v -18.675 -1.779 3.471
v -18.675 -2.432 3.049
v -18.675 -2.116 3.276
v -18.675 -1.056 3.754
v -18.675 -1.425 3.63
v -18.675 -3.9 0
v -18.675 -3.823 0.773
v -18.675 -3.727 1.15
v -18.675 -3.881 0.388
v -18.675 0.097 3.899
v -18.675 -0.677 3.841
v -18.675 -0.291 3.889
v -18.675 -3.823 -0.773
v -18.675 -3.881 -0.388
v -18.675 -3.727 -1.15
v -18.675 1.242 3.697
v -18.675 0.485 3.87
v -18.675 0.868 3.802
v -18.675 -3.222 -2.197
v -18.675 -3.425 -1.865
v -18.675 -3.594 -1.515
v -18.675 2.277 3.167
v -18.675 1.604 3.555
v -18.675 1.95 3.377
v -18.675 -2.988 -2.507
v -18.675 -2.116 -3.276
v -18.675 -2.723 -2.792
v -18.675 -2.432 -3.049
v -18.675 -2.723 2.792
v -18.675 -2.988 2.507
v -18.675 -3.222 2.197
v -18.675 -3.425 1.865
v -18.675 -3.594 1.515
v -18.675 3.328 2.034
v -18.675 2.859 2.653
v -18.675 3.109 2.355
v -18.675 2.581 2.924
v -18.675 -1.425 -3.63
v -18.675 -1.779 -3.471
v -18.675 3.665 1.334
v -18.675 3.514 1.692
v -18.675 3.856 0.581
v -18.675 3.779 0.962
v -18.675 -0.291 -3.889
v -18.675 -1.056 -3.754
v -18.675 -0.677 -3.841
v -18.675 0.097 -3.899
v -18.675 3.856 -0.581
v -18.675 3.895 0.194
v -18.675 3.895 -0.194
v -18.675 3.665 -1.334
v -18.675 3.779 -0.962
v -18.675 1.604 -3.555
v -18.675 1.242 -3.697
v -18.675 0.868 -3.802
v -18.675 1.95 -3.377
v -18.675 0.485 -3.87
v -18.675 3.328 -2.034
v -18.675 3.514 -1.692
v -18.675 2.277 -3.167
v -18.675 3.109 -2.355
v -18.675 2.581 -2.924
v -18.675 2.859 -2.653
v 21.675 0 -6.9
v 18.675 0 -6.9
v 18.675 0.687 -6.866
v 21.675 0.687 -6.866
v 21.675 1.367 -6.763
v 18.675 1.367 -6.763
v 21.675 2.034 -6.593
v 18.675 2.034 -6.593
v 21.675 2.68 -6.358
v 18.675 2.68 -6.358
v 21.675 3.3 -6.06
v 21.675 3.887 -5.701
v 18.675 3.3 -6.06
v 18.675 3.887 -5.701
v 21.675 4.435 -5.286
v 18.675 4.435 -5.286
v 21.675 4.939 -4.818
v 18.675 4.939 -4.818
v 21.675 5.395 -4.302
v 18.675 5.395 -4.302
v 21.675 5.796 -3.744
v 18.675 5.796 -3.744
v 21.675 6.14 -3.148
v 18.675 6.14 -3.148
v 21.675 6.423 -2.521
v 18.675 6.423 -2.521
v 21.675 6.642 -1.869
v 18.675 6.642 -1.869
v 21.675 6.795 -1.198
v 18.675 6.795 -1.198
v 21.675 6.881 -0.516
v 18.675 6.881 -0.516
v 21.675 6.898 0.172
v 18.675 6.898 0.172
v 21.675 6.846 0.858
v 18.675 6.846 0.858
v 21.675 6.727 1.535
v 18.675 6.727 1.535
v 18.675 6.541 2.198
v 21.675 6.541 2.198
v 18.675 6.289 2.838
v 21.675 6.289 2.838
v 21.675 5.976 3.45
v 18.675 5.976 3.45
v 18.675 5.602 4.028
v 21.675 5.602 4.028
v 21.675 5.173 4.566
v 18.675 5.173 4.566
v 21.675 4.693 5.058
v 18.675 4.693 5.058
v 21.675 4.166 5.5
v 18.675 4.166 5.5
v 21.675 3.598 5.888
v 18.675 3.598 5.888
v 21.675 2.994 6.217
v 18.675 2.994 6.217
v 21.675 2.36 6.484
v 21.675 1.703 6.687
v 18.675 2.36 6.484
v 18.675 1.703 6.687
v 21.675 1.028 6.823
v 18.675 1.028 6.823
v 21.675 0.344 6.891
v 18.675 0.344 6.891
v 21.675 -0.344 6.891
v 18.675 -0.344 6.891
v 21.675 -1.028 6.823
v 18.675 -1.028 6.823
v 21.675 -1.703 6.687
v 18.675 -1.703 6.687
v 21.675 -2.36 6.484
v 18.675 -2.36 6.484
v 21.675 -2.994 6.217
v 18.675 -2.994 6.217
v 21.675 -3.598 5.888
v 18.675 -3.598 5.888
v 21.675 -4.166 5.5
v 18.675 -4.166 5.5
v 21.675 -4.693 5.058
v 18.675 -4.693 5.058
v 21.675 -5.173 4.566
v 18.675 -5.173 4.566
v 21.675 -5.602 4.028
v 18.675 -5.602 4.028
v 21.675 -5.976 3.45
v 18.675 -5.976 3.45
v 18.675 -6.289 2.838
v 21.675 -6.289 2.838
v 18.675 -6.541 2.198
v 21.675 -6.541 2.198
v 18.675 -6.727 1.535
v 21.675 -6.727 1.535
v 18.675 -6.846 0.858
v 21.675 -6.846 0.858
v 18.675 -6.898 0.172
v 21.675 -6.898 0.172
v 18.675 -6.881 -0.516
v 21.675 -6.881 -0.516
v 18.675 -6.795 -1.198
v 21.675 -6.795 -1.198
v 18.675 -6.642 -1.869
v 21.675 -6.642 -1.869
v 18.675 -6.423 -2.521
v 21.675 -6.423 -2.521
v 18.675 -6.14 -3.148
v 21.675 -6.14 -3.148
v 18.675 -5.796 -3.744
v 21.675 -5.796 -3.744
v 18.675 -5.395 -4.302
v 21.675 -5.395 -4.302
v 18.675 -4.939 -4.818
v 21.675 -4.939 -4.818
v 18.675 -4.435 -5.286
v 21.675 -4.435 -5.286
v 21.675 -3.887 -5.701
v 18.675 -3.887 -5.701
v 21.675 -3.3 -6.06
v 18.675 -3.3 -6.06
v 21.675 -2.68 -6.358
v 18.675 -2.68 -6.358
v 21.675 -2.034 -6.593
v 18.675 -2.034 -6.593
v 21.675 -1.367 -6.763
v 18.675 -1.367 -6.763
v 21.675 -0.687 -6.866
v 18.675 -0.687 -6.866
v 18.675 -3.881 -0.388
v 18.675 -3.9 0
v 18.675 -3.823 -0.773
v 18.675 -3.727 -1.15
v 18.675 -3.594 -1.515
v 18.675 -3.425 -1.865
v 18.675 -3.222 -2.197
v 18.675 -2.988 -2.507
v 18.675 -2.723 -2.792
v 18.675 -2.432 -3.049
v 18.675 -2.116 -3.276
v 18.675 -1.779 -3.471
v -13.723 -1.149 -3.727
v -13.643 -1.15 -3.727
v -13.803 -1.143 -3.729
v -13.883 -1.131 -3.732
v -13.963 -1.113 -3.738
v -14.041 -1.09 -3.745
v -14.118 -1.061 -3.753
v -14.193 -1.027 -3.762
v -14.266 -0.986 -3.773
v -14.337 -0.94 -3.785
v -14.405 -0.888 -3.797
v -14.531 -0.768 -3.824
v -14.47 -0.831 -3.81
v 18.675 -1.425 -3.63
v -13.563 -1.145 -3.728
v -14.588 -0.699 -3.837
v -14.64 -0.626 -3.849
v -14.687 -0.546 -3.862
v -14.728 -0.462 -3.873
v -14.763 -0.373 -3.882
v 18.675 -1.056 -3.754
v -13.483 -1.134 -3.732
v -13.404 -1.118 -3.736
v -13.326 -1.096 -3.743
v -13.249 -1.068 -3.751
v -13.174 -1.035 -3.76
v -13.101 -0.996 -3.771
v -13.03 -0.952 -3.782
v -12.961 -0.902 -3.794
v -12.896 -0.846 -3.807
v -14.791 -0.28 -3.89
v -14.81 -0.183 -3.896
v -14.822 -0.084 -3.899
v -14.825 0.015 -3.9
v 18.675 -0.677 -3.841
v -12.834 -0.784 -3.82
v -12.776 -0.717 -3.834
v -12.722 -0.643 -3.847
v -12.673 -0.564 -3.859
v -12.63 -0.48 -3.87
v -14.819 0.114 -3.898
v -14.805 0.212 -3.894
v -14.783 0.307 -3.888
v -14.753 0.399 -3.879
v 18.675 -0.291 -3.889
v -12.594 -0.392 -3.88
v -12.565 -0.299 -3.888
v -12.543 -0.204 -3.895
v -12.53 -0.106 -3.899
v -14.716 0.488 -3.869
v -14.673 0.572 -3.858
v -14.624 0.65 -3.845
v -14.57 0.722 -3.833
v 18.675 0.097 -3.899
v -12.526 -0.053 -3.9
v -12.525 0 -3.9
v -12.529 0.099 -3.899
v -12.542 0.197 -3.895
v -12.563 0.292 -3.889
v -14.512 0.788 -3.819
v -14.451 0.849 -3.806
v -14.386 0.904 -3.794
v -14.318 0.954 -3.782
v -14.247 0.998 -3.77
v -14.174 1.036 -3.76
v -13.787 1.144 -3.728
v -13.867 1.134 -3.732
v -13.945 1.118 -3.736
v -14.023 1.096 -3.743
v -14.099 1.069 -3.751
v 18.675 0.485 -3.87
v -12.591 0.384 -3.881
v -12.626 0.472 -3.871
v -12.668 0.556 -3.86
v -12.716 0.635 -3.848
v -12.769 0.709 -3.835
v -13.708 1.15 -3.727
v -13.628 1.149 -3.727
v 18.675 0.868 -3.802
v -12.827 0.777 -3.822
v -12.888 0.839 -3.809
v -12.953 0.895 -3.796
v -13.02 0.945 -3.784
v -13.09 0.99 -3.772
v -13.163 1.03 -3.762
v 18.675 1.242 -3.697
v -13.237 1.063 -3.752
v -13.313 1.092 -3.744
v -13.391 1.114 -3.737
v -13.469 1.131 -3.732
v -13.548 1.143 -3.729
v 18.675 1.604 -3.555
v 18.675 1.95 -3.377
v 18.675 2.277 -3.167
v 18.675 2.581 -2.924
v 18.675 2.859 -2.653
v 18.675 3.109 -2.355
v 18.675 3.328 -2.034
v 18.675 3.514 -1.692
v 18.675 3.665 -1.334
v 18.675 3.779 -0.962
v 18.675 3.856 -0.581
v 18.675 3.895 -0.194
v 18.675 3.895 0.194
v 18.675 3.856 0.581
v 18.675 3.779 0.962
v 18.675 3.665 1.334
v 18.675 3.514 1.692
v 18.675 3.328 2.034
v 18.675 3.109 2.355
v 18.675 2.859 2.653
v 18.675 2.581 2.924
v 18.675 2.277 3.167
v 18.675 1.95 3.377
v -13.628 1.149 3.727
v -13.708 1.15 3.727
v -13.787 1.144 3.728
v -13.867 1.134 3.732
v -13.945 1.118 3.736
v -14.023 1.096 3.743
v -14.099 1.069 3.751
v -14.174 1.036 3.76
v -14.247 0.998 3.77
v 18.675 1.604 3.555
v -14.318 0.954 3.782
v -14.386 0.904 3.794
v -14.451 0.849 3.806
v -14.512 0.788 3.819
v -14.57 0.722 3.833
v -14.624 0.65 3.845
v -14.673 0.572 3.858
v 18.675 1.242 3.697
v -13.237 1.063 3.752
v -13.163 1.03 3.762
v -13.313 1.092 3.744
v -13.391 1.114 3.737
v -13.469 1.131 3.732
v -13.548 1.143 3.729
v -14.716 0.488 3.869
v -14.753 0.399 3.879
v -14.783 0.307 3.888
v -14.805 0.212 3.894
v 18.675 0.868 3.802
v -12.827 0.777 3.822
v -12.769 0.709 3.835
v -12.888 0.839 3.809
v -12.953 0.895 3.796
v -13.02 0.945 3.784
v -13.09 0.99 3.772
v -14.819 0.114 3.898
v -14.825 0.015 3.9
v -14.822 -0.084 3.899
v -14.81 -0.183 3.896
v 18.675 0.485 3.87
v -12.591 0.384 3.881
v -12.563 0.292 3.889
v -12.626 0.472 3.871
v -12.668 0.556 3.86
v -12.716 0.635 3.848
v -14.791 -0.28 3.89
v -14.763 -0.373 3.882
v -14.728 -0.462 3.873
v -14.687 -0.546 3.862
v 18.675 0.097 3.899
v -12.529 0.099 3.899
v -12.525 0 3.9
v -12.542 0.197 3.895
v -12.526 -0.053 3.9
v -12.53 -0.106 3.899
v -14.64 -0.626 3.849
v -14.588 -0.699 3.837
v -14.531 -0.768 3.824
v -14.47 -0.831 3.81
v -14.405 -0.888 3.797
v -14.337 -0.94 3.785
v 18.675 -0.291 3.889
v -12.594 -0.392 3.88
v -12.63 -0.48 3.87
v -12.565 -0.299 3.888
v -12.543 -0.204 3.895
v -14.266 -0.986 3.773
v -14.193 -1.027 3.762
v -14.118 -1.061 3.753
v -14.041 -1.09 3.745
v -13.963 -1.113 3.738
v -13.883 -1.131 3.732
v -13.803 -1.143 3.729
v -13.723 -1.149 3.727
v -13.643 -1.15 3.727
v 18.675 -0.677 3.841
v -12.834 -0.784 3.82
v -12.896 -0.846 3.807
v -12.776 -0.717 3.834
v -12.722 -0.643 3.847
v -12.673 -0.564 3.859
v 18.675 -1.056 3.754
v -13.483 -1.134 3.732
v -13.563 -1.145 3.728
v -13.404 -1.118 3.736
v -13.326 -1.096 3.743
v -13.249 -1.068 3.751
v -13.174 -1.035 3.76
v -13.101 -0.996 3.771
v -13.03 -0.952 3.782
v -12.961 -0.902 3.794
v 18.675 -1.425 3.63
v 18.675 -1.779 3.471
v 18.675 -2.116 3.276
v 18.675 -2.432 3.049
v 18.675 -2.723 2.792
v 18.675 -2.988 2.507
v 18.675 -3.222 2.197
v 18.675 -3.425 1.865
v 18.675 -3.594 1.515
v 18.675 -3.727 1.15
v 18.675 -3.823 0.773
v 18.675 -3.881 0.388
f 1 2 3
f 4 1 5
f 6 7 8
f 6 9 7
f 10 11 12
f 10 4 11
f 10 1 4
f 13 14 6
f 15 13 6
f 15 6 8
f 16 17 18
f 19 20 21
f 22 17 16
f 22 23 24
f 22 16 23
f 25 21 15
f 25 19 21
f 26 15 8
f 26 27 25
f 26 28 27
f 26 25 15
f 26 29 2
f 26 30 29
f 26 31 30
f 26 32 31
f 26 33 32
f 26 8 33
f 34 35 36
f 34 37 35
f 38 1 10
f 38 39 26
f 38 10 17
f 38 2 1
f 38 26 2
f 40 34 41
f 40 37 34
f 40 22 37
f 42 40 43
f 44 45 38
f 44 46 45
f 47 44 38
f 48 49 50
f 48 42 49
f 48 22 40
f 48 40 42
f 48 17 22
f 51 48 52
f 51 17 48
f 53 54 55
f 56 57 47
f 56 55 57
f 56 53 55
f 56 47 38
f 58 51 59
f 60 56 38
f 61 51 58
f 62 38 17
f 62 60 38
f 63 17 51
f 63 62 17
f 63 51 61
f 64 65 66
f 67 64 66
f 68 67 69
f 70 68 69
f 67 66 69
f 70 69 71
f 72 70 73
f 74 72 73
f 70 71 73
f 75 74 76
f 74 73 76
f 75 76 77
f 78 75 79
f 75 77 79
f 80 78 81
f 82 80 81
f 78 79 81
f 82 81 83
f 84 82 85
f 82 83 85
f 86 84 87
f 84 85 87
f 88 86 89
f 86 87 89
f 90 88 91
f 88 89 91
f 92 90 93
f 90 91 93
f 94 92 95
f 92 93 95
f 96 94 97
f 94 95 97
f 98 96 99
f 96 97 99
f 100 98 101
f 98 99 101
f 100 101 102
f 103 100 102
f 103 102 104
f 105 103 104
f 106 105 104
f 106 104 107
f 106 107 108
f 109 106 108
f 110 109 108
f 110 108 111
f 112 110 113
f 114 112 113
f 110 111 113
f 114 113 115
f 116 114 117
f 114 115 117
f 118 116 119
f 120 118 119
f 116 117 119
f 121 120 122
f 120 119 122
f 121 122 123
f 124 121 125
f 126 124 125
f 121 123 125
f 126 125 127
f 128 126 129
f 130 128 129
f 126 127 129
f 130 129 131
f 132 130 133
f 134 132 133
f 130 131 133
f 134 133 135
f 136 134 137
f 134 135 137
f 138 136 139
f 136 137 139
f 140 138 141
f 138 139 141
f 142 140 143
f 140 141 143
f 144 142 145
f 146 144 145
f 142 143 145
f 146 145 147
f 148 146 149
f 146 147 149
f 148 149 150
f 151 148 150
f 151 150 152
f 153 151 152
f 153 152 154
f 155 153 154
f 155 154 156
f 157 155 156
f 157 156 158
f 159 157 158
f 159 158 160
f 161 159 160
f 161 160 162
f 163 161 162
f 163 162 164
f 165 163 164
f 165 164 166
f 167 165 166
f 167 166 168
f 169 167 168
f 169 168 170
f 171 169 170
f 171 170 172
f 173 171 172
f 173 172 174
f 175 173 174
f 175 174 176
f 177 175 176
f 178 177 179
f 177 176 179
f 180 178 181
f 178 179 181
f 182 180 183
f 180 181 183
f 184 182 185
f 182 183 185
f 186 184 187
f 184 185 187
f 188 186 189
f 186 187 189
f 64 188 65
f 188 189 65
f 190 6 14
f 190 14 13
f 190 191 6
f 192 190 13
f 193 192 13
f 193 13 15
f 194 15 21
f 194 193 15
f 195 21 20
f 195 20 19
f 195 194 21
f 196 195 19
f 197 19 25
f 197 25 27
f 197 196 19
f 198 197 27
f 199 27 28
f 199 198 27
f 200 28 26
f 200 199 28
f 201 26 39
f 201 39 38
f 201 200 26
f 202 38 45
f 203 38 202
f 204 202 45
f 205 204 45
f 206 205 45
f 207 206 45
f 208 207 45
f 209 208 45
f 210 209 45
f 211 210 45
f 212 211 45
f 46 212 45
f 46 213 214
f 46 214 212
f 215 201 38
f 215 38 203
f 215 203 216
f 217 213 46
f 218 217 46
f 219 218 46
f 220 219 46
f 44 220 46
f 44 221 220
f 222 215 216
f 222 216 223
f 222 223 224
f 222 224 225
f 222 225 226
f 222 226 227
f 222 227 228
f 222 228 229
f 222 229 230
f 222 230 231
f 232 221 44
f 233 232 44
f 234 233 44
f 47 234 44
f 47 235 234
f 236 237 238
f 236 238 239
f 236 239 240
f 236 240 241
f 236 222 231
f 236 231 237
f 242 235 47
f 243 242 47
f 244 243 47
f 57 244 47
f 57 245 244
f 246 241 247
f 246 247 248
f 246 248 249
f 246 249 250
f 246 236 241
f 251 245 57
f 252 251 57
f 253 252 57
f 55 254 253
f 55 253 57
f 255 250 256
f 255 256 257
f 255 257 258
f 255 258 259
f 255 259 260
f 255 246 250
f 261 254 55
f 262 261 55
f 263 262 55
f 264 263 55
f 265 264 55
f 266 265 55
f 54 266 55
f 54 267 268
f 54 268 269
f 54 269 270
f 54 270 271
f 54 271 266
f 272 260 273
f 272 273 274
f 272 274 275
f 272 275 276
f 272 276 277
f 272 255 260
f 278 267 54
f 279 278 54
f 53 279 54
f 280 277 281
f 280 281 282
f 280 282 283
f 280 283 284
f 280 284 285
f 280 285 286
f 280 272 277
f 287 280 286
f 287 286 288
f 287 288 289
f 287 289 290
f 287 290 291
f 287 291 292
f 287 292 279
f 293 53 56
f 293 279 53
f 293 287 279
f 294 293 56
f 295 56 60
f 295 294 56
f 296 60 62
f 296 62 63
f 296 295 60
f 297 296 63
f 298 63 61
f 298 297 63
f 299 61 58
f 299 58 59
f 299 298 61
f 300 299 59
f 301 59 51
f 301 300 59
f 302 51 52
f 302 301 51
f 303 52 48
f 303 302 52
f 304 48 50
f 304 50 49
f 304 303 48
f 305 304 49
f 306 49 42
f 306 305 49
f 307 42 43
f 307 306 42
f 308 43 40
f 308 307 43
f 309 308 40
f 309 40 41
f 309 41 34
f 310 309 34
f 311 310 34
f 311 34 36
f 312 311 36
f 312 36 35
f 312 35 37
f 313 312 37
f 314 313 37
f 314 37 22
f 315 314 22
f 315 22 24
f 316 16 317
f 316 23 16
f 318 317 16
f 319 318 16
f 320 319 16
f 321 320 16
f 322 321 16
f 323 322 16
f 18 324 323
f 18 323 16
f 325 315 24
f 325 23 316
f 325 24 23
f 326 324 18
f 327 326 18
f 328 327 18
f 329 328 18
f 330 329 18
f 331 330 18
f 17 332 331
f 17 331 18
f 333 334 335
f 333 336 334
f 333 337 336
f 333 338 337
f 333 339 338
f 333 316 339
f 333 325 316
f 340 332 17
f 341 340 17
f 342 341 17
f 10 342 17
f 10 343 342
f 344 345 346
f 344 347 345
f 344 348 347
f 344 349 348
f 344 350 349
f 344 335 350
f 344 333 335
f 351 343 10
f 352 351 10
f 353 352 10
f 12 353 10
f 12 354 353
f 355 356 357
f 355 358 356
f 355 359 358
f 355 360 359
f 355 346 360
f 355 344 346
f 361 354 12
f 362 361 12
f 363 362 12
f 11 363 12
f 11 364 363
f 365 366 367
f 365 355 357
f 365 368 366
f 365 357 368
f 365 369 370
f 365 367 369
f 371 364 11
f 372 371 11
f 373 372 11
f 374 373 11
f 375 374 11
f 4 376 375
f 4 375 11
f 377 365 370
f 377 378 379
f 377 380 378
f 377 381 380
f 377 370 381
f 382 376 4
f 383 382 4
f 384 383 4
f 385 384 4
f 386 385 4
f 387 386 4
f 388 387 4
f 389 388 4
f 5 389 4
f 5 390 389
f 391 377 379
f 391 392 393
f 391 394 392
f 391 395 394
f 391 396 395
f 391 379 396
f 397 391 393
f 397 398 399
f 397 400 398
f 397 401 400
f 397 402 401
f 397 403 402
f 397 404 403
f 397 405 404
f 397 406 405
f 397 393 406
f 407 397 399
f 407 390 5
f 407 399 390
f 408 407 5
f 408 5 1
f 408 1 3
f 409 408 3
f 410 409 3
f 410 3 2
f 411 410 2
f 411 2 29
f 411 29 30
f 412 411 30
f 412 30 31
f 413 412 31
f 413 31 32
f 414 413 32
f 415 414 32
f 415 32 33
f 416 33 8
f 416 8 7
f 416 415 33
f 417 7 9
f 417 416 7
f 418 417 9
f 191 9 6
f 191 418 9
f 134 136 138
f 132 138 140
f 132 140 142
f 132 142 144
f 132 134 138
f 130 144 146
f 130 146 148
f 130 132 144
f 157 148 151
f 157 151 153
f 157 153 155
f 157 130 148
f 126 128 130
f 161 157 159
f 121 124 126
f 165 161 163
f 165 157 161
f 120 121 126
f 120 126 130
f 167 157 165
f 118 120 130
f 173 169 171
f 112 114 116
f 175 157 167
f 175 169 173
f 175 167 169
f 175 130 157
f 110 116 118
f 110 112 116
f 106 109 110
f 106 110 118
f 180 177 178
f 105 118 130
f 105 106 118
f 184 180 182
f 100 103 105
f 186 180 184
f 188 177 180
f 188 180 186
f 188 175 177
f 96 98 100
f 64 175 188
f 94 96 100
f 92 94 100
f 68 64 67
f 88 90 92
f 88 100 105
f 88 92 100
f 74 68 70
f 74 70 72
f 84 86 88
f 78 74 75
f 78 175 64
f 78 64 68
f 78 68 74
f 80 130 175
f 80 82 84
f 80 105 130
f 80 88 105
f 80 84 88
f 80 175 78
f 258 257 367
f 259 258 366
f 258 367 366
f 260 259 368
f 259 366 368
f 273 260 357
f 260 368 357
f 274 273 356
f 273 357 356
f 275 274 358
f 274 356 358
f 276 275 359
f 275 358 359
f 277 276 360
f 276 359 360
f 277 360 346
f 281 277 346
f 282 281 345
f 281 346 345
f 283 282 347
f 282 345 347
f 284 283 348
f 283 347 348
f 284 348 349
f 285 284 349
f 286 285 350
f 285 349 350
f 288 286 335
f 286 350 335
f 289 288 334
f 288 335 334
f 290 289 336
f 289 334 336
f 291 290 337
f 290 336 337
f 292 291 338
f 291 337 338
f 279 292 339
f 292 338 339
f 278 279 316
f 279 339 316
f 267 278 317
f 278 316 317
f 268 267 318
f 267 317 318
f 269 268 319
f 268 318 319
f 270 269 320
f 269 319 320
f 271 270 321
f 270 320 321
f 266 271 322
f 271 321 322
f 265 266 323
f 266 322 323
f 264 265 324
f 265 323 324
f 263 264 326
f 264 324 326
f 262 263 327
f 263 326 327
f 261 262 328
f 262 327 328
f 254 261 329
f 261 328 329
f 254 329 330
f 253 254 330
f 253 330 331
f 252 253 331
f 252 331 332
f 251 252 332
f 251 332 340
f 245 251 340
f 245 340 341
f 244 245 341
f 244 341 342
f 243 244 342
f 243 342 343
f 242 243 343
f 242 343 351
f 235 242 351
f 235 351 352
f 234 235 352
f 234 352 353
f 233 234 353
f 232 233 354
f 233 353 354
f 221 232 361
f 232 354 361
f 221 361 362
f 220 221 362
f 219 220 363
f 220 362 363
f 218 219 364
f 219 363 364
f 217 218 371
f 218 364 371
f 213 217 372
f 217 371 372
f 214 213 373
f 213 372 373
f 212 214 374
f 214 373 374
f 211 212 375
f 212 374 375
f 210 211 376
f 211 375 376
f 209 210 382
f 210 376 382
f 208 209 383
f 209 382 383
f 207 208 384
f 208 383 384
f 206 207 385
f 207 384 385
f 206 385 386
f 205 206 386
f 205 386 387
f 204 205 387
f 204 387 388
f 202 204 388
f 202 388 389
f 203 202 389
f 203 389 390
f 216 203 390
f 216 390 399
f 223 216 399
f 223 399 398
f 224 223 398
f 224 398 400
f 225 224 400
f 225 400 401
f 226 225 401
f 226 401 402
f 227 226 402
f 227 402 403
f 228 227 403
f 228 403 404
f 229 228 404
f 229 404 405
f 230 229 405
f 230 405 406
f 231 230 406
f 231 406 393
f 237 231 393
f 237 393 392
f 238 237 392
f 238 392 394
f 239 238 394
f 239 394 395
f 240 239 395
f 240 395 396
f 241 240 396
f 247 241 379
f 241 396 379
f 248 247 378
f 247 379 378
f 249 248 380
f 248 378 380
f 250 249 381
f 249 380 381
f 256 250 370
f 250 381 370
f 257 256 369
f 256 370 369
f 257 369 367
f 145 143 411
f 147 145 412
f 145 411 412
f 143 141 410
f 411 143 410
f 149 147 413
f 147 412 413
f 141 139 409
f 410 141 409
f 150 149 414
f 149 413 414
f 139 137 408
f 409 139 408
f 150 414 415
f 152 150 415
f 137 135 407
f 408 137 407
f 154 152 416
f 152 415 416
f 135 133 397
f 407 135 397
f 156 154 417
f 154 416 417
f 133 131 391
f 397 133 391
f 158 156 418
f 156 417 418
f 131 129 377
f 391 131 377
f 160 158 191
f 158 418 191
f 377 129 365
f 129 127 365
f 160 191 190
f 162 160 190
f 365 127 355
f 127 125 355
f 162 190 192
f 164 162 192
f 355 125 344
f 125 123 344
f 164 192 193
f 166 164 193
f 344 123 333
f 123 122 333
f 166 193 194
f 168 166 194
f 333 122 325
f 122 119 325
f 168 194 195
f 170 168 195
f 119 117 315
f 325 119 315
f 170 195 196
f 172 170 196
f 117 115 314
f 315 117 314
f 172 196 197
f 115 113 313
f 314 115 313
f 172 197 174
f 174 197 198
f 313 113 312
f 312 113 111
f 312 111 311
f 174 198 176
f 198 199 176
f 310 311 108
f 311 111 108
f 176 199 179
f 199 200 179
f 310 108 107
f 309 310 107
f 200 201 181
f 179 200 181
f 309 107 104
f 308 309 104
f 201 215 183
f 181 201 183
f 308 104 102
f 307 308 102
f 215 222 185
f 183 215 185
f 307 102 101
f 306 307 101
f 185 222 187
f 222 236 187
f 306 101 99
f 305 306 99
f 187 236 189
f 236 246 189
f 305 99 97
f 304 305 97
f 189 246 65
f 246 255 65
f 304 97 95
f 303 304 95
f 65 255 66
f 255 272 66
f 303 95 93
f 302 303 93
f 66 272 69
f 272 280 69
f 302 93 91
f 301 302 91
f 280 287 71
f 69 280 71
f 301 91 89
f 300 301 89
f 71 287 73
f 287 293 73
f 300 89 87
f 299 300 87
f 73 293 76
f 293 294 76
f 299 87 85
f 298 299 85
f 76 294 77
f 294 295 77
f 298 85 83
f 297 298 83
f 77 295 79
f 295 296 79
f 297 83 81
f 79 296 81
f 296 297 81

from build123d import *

# Parameters (mm, degrees)
SKETCH2_3_R             = 1.15
CUT_EXTRUDE1_DEPTH      = 4.9
CUT_EXTRUDE1_DEPTH_BACK = 4.9
SKETCH3_R               = 6.9
BOSS_EXTRUDE1_DEPTH     = 3


with BuildPart() as part:
    # Sketch2 → Revolve2 (revolve)
    with BuildSketch(Plane.XY):
        with BuildLine():
            Line((18.675, 0), (-12.525, 0))
            ThreePointArc((-12.525, 0), (-13.675, -1.15), (-14.825, 0))
            Line((-14.825, 0), (-18.675, 0))
            Line((-18.675, 0), (-18.675, -3.9))
            Line((-18.675, -3.9), (18.675, -3.9))
            Line((18.675, -3.9), (18.675, 0))
        make_face()
    revolve(axis=Axis((-18.675, 0, 0), (1, 0, 0)))

    # Sketch2<3> → Cut-Extrude1 (cut, two sides)
    with BuildSketch(Plane.XY) as cut_extrude1_sk:
        with Locations((-13.675, 0)):
            Circle(SKETCH2_3_R)
    extrude(amount=CUT_EXTRUDE1_DEPTH, mode=Mode.SUBTRACT)
    extrude(cut_extrude1_sk.sketch, amount=-CUT_EXTRUDE1_DEPTH_BACK, mode=Mode.SUBTRACT)

    # Sketch3 → Boss-Extrude1 (add)
    with BuildSketch(Plane(origin=(18.675, 0, 0), x_dir=(0, 0, -1), z_dir=(1, 0, 0))):
        Circle(SKETCH3_R)
    extrude(amount=BOSS_EXTRUDE1_DEPTH)


solid = part.part
